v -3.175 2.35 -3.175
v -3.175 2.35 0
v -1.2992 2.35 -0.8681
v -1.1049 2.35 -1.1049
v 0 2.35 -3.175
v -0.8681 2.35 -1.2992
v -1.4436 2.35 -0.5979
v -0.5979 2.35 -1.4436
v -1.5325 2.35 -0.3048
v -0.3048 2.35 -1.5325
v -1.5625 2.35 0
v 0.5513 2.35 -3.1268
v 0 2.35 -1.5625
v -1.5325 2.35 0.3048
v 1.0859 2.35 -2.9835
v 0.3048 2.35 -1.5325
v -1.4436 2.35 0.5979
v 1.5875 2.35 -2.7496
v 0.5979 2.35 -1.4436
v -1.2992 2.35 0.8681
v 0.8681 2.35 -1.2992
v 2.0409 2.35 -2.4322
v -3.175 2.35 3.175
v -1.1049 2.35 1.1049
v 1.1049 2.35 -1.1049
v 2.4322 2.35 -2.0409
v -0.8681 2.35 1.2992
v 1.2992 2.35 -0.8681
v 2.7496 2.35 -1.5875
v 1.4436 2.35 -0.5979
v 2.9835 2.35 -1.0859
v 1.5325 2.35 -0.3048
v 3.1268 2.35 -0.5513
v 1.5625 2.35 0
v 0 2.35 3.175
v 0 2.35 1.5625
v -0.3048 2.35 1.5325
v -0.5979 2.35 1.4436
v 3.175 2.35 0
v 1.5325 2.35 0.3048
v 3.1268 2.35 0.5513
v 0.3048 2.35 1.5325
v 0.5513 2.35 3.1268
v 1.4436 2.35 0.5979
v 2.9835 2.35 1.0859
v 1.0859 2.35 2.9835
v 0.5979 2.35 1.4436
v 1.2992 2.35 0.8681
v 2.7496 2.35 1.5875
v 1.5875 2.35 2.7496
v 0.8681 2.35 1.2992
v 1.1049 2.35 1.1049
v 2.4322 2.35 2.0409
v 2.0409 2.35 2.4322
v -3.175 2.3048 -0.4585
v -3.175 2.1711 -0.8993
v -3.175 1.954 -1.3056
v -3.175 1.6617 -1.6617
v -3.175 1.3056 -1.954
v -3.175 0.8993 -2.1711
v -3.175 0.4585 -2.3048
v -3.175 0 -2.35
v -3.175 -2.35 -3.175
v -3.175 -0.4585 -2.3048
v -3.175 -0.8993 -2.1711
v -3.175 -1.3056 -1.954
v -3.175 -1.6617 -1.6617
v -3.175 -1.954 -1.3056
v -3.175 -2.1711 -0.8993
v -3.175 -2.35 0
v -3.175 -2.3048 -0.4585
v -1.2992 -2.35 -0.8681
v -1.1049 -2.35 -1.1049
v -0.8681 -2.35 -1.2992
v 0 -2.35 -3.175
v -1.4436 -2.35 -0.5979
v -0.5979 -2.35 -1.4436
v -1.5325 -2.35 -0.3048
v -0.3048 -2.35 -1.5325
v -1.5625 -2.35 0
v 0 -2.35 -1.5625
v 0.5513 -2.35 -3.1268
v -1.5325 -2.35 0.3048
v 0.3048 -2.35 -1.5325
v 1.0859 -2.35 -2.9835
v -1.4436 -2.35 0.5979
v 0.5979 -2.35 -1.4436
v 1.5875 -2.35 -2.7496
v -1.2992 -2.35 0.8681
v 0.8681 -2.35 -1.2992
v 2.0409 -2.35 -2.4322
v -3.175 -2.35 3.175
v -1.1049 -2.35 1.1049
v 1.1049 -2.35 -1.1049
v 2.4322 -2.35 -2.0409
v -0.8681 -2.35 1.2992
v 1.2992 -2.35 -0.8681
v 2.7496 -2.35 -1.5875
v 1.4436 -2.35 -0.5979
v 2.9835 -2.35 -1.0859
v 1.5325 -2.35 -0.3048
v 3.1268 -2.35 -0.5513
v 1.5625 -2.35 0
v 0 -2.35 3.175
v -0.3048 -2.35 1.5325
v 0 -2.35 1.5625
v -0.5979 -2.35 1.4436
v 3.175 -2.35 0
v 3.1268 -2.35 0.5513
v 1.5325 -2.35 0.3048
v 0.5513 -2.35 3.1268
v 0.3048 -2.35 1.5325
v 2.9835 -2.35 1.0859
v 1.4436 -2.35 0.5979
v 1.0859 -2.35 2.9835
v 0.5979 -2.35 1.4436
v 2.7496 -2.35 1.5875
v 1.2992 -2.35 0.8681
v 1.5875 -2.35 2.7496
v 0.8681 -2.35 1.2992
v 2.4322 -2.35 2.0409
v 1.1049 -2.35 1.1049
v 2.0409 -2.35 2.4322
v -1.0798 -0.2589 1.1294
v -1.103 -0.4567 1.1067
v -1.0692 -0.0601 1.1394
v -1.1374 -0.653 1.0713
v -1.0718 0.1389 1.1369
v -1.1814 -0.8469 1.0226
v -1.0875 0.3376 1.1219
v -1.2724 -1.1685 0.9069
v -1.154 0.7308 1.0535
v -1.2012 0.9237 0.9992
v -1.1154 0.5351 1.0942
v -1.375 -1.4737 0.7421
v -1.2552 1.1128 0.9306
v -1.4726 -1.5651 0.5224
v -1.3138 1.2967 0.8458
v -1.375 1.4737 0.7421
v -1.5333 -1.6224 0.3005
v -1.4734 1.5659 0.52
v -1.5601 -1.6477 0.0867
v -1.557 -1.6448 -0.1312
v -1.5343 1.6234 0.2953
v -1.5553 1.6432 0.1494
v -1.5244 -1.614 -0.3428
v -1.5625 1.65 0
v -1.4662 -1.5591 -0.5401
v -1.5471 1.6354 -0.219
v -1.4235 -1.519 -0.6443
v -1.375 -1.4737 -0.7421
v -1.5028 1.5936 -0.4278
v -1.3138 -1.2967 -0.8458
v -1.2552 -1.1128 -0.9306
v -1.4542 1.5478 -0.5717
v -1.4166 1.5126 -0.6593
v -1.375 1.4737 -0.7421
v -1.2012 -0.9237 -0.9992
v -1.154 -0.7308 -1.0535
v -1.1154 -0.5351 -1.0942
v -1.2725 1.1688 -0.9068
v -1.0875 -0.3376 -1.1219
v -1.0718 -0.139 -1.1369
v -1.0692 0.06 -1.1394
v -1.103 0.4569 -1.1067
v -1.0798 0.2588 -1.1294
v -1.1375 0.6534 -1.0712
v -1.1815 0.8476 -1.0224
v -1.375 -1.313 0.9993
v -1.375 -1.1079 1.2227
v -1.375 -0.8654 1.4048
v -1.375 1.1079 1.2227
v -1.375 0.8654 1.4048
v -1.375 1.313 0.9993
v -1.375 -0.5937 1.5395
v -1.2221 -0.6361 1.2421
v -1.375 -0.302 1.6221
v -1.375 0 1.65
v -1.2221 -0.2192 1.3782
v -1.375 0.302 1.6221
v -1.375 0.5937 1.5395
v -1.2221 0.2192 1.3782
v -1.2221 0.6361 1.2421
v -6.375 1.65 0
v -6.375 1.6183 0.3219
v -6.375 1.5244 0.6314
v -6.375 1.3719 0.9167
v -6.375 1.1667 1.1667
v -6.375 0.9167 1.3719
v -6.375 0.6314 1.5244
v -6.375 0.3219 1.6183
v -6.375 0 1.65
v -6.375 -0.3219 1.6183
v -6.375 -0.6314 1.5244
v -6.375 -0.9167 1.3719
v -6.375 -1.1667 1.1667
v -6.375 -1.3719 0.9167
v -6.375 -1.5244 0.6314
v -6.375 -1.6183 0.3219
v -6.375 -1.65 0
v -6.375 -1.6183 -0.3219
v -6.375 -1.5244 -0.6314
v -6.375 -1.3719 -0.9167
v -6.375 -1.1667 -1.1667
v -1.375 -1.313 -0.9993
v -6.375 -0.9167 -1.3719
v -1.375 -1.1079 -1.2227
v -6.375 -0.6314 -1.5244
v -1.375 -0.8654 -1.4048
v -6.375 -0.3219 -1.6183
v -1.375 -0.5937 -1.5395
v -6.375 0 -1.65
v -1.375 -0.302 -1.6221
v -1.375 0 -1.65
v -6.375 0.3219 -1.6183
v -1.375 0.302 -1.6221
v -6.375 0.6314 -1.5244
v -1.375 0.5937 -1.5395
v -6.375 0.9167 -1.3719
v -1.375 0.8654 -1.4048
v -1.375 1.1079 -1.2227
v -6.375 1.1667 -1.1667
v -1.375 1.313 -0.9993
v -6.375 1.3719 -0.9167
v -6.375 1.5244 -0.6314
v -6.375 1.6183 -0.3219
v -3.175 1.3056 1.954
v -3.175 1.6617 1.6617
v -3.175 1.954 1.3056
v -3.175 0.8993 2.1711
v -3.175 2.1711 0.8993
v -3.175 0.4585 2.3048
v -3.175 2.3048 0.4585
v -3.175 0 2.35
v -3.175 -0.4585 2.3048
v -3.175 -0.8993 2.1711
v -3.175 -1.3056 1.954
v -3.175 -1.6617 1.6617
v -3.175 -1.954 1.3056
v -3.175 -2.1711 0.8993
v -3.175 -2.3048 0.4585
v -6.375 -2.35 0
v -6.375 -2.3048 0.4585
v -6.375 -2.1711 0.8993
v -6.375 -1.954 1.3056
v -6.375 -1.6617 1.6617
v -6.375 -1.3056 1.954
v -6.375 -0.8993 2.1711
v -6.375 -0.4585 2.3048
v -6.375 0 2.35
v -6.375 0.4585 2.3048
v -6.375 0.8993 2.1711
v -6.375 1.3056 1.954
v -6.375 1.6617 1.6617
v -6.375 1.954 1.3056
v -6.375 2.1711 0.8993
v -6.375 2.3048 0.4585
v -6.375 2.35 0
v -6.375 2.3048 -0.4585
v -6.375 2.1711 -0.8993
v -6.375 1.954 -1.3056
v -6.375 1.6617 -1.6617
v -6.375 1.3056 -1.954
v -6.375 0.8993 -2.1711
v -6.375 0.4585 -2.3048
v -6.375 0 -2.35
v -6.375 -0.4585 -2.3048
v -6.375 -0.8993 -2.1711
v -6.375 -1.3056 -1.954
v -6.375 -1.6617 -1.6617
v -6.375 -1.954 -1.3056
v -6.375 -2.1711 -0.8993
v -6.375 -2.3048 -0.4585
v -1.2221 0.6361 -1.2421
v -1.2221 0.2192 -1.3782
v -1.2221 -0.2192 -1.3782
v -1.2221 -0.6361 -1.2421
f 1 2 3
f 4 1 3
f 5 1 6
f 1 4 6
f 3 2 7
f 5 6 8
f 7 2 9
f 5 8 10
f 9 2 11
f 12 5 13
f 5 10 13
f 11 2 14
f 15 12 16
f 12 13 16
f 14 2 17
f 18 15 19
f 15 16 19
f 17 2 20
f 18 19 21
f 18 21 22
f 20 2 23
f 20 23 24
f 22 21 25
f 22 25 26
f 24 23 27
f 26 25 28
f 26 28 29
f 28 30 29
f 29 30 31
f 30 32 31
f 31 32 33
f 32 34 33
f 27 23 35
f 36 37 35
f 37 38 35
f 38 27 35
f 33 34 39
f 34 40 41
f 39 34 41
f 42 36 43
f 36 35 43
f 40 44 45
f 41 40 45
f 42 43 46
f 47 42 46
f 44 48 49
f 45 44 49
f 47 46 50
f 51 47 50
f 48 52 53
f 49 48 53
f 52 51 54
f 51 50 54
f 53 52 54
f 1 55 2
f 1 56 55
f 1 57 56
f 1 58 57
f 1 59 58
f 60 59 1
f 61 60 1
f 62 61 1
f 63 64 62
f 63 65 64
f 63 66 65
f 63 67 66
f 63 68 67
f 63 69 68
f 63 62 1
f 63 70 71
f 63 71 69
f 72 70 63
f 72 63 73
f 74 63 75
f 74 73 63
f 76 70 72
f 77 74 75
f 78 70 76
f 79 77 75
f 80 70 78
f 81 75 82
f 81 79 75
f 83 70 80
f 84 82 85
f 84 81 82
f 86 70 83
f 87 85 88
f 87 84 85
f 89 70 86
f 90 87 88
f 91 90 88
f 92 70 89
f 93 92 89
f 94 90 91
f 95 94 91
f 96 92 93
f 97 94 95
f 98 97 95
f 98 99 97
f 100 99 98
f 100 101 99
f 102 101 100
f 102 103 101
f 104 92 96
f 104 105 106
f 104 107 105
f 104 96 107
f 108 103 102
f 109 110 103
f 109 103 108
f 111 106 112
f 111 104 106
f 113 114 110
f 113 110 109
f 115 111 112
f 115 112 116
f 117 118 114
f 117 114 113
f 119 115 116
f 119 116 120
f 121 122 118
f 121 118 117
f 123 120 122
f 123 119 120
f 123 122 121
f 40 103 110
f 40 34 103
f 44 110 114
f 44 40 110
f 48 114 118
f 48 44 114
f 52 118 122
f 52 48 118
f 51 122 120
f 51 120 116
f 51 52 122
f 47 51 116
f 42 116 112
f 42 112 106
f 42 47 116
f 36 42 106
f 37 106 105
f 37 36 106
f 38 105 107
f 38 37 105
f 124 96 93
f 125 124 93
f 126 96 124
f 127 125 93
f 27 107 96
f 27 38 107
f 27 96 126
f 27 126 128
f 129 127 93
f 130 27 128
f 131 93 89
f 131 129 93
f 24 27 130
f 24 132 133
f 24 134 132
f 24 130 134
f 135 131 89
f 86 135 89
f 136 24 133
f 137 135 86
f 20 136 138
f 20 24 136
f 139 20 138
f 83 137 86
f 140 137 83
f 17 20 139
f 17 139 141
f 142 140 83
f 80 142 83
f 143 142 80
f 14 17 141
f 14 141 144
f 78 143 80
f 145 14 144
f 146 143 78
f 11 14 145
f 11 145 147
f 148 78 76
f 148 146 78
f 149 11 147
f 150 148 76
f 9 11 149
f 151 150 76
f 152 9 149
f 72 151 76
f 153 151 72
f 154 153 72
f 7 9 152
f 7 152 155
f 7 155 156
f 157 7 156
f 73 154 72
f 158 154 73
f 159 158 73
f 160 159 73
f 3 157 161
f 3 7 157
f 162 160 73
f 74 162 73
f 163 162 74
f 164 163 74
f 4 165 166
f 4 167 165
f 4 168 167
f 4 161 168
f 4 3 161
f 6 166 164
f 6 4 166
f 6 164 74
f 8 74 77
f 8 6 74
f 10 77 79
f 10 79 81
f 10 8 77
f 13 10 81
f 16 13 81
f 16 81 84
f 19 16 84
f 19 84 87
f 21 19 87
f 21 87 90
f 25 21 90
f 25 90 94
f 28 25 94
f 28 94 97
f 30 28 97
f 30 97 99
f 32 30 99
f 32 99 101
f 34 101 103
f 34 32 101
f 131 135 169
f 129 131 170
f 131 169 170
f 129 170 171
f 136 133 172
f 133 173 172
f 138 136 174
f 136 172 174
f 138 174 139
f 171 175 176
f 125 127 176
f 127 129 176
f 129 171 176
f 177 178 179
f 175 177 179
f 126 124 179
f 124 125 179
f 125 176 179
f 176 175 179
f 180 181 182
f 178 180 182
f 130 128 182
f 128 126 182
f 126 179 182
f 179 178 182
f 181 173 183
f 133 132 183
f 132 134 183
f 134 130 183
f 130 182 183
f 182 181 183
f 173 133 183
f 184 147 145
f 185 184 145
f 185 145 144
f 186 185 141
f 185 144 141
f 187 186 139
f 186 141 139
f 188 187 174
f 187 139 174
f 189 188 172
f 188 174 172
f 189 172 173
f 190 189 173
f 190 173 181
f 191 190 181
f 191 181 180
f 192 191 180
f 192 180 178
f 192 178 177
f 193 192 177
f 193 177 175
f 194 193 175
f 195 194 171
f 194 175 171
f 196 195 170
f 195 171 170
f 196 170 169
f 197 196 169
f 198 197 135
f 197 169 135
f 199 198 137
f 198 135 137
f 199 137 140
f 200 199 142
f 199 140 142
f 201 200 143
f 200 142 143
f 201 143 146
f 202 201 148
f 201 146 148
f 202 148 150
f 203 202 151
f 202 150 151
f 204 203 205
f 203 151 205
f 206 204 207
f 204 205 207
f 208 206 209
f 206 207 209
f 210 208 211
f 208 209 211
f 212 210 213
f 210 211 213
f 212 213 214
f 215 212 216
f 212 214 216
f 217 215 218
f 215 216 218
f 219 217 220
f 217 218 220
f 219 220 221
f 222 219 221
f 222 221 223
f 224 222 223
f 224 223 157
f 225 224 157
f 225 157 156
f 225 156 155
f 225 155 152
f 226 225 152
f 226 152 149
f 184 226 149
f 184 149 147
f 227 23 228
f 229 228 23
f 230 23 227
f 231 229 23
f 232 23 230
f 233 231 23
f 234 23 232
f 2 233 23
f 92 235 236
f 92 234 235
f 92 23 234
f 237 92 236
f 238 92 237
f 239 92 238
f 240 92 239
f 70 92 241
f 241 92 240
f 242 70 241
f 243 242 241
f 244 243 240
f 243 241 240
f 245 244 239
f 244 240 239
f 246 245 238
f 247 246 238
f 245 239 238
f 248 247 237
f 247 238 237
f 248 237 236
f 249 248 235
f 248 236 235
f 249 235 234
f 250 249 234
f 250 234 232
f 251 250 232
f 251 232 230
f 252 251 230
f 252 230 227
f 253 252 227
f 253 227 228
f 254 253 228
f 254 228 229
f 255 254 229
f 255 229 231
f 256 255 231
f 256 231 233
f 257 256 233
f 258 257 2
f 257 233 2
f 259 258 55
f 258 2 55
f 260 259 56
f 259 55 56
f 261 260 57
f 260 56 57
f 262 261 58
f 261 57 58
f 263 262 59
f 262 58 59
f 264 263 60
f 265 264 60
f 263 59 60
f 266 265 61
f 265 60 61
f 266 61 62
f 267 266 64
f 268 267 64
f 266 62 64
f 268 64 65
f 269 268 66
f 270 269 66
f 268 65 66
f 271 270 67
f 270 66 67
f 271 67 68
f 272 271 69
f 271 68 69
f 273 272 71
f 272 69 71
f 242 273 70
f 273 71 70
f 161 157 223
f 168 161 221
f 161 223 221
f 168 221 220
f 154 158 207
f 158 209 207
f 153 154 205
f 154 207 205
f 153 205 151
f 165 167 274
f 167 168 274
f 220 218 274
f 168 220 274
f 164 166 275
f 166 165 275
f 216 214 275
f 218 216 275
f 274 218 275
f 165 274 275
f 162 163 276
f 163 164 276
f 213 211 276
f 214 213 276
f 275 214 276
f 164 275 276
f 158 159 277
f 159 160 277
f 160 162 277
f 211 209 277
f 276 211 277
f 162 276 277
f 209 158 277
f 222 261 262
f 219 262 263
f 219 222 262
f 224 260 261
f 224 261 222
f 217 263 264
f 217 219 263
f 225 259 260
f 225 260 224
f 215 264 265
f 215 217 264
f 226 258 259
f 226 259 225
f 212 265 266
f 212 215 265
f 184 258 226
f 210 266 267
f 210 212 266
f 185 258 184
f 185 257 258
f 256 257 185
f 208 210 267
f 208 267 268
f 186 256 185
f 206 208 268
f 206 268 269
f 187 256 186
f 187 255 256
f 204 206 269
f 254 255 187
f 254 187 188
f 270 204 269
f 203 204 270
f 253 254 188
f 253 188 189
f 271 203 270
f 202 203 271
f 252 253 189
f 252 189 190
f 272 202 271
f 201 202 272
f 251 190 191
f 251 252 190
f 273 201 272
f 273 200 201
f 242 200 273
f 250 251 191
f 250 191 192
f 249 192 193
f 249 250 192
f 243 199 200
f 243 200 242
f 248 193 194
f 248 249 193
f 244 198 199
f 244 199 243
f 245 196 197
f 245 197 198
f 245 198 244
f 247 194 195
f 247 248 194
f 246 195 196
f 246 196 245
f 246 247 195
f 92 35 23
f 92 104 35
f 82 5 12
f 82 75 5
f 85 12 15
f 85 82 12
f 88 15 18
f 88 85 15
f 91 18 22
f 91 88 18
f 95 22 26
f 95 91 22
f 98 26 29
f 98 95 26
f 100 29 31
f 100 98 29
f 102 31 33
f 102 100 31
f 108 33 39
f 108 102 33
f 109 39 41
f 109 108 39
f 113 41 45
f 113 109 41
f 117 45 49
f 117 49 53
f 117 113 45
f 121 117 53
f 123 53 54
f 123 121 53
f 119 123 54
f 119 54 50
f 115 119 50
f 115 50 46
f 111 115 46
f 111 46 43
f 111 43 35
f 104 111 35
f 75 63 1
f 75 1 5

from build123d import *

# Parameters (mm, degrees)
F0_R     = 1.5625
F1_DEPTH = 2.35
F3_DEPTH = 3.2
F5_D     = 3.3
F5_DEPTH = 5
F5_TIP   = 0.9914200214


with BuildPart() as f1:
    # F0 (on Front) → F1 (new body, symmetric)
    with BuildSketch(Plane.XZ):
        with BuildLine():
            Line((0, 3.175), (-3.175, 3.175))
            Line((-3.175, 3.175), (-3.175, -3.175))
            Line((-3.175, -3.175), (0, -3.175))
            ThreePointArc((0, -3.175), (3.175, 0), (0, 3.175))
        make_face()
        Circle(F0_R, mode=Mode.SUBTRACT)
    extrude(amount=F1_DEPTH, both=True)

    # F2 (on face) → F3 (join)
    with BuildSketch(Plane(origin=(-3.175, 0, 0), x_dir=(0, -1, 0), z_dir=(-1, 0, 0))):
        with BuildLine():
            ThreePointArc((-2.35, 0), (0, -2.35), (2.35, 0))
            ThreePointArc((2.35, 0), (0, 2.35), (-2.35, 0))
        make_face()
    extrude(amount=F3_DEPTH)

    # F5
    with Locations(Plane(origin=(-6.375, 0, 0), x_dir=(0, -1, 0), z_dir=(-1, 0, 0))):
        with Locations((0, 0)):
            Hole(F5_D / 2, depth=F5_DEPTH)
            with Locations((0, 0, -(F5_DEPTH + F5_TIP / 2))):  # 118° drill point
                Cone(0, F5_D / 2, F5_TIP, mode=Mode.SUBTRACT)


solid = f1.part
